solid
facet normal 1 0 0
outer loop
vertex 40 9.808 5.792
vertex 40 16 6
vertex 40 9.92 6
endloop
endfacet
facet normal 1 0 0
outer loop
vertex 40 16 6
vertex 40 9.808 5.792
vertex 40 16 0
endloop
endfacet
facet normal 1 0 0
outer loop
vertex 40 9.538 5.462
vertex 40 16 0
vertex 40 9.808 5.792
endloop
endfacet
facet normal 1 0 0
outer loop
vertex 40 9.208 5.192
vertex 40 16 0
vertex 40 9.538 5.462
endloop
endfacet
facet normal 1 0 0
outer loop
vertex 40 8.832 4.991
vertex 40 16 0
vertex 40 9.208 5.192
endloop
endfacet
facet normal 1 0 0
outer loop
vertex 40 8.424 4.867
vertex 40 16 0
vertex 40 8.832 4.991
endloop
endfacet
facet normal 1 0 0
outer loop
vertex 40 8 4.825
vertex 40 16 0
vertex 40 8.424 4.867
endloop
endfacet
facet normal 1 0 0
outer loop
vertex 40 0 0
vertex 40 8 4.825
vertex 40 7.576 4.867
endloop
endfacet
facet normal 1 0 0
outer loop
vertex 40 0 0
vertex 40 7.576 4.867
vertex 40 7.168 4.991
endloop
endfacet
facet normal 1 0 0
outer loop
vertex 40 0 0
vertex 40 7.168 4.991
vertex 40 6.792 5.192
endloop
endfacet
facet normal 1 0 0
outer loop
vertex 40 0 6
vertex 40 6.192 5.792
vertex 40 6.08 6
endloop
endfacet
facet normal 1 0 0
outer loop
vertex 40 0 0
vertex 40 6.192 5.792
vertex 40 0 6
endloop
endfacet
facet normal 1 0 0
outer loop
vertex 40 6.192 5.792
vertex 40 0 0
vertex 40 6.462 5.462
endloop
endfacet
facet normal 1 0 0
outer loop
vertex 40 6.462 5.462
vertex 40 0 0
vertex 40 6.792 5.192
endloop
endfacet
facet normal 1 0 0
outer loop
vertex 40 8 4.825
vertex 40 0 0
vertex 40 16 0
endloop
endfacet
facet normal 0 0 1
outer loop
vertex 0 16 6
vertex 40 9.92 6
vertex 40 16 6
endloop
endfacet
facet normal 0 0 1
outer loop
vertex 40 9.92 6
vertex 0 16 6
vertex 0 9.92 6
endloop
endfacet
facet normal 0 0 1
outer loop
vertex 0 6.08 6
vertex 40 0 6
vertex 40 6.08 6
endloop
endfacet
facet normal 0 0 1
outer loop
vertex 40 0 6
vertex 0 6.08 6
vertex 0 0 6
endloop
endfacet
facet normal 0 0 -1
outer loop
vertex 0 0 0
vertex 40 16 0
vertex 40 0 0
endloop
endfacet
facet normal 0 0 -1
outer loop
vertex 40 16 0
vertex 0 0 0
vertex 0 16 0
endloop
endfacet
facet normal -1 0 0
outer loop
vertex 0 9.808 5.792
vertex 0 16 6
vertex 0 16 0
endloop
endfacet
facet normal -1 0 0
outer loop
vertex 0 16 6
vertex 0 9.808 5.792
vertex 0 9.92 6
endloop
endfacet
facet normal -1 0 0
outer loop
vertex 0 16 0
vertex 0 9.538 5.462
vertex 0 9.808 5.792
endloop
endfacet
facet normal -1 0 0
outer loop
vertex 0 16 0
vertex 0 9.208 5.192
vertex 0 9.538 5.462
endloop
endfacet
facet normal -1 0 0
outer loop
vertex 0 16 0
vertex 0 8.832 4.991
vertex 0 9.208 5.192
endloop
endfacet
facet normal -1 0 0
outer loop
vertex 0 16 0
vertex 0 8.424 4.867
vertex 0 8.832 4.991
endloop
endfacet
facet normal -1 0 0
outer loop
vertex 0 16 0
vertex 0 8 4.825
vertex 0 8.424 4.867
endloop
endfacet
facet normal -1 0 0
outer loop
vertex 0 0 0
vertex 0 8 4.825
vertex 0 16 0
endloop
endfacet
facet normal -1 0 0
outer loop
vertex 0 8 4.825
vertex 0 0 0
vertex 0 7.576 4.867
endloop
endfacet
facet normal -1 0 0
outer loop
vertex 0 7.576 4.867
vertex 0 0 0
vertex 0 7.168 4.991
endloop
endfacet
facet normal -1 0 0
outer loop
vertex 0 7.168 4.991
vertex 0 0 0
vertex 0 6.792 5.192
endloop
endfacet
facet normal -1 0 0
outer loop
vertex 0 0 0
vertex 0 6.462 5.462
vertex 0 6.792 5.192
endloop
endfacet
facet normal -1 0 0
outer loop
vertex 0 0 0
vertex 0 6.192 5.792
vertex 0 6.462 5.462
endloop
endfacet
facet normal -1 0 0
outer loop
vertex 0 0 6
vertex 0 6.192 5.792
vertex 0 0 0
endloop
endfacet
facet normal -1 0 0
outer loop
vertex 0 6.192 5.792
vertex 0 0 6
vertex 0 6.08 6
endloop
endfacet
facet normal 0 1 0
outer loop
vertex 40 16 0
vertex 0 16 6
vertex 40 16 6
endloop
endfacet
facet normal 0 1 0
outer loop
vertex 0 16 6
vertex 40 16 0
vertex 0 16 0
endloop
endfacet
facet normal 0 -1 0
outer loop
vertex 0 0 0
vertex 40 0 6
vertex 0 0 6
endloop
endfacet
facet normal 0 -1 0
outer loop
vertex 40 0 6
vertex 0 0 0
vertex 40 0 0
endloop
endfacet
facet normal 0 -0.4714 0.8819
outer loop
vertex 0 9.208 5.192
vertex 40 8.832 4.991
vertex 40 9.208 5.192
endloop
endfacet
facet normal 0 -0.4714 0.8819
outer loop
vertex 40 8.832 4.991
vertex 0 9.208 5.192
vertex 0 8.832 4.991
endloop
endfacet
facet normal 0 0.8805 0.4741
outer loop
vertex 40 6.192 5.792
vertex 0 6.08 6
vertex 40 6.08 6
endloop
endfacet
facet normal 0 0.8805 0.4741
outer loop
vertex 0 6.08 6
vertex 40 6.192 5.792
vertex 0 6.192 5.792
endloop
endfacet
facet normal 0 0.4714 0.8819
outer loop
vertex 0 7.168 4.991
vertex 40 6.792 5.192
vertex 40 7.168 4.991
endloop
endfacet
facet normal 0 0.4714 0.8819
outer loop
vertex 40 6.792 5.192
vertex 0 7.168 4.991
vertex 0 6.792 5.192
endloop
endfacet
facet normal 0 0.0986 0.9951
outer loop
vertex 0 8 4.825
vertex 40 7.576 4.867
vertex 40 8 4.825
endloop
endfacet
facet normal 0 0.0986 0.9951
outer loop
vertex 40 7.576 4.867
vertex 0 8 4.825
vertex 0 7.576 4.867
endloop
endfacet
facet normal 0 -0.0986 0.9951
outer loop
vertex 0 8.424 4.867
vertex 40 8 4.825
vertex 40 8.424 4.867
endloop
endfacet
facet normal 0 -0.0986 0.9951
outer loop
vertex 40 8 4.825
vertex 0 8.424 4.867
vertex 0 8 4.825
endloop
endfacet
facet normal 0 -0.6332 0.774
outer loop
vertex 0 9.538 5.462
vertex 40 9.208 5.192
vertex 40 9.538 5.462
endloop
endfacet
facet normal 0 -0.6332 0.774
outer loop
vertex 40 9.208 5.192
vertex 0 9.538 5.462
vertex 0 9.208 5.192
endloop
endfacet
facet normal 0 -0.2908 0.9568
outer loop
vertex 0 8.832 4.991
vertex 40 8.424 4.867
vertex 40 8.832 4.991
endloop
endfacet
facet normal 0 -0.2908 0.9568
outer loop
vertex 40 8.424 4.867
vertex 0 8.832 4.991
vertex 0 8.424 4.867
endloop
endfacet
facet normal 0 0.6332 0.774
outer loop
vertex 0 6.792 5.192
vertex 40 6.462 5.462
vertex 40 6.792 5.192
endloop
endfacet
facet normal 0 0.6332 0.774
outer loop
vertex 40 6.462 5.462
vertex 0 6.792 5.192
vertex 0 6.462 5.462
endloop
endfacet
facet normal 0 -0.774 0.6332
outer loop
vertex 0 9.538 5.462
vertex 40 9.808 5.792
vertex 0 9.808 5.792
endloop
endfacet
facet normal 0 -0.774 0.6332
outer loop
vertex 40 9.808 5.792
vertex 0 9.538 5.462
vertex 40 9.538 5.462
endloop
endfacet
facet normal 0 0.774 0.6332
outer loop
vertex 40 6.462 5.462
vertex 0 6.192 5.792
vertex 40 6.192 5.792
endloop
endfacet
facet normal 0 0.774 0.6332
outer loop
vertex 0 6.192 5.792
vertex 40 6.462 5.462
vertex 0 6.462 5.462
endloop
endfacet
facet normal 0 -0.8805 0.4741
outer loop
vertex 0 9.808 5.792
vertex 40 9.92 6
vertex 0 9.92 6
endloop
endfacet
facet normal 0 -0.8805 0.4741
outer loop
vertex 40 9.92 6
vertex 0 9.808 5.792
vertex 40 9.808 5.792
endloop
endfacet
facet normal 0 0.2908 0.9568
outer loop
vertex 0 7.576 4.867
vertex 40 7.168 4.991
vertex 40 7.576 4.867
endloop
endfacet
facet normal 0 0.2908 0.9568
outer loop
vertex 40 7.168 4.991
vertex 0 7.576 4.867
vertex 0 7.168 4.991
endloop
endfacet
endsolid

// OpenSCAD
// Пробники для helix_support.scad. Размеры в мм.
/* [Выбор] */
test_part=0; // [0:Канавка,1:Внешнее кольцо,2:Внутреннее кольцо]
antenna=0; // [0:550-720 МГц,1:720-1000 МГц]
wire_d=4; // [3:0.5:5]
wire_clearance=0.35;
wall=3;
fit_clearance=0.25;
$fn=32; // как при точном рендере основной трубы
c=299792.458;
freq=antenna==0?635:860;
tube_r=c/freq/(2*PI)-wire_d*0.25;
inner_r=tube_r-wall;
module arc_piece(r_out,r_in,h) {
 intersection() {
  difference() {cylinder(r=r_out,h=h); translate([0,0,-0.1]) cylinder(r=r_in,h=h+0.2);}
  translate([inner_r-8,-15,0]) cube([12,30,h]);
 }
}
if(test_part==0) {
 // Прямой участок с тем же поперечным профилем, что и канавка на трубе.
 difference() {
  cube([40,16,6]);
  translate([-1,8,6+wire_d*0.25]) rotate([0,90,0]) cylinder(d=wire_d+wire_clearance,h=42);
 }
}
if(test_part==1) {
 // Стенка трубы: принимающая часть соединения.
 difference() { cylinder(r=tube_r,h=12); translate([0,0,-0.1]) cylinder(r=inner_r,h=12.2); }
}
if(test_part==2) {
 // Поясок входит внутрь стенки; зазор задаётся по радиусу.
 difference() { cylinder(r=inner_r-fit_clearance,h=12); translate([0,0,-0.1]) cylinder(r=inner_r-fit_clearance-wall,h=12.2); }
}
